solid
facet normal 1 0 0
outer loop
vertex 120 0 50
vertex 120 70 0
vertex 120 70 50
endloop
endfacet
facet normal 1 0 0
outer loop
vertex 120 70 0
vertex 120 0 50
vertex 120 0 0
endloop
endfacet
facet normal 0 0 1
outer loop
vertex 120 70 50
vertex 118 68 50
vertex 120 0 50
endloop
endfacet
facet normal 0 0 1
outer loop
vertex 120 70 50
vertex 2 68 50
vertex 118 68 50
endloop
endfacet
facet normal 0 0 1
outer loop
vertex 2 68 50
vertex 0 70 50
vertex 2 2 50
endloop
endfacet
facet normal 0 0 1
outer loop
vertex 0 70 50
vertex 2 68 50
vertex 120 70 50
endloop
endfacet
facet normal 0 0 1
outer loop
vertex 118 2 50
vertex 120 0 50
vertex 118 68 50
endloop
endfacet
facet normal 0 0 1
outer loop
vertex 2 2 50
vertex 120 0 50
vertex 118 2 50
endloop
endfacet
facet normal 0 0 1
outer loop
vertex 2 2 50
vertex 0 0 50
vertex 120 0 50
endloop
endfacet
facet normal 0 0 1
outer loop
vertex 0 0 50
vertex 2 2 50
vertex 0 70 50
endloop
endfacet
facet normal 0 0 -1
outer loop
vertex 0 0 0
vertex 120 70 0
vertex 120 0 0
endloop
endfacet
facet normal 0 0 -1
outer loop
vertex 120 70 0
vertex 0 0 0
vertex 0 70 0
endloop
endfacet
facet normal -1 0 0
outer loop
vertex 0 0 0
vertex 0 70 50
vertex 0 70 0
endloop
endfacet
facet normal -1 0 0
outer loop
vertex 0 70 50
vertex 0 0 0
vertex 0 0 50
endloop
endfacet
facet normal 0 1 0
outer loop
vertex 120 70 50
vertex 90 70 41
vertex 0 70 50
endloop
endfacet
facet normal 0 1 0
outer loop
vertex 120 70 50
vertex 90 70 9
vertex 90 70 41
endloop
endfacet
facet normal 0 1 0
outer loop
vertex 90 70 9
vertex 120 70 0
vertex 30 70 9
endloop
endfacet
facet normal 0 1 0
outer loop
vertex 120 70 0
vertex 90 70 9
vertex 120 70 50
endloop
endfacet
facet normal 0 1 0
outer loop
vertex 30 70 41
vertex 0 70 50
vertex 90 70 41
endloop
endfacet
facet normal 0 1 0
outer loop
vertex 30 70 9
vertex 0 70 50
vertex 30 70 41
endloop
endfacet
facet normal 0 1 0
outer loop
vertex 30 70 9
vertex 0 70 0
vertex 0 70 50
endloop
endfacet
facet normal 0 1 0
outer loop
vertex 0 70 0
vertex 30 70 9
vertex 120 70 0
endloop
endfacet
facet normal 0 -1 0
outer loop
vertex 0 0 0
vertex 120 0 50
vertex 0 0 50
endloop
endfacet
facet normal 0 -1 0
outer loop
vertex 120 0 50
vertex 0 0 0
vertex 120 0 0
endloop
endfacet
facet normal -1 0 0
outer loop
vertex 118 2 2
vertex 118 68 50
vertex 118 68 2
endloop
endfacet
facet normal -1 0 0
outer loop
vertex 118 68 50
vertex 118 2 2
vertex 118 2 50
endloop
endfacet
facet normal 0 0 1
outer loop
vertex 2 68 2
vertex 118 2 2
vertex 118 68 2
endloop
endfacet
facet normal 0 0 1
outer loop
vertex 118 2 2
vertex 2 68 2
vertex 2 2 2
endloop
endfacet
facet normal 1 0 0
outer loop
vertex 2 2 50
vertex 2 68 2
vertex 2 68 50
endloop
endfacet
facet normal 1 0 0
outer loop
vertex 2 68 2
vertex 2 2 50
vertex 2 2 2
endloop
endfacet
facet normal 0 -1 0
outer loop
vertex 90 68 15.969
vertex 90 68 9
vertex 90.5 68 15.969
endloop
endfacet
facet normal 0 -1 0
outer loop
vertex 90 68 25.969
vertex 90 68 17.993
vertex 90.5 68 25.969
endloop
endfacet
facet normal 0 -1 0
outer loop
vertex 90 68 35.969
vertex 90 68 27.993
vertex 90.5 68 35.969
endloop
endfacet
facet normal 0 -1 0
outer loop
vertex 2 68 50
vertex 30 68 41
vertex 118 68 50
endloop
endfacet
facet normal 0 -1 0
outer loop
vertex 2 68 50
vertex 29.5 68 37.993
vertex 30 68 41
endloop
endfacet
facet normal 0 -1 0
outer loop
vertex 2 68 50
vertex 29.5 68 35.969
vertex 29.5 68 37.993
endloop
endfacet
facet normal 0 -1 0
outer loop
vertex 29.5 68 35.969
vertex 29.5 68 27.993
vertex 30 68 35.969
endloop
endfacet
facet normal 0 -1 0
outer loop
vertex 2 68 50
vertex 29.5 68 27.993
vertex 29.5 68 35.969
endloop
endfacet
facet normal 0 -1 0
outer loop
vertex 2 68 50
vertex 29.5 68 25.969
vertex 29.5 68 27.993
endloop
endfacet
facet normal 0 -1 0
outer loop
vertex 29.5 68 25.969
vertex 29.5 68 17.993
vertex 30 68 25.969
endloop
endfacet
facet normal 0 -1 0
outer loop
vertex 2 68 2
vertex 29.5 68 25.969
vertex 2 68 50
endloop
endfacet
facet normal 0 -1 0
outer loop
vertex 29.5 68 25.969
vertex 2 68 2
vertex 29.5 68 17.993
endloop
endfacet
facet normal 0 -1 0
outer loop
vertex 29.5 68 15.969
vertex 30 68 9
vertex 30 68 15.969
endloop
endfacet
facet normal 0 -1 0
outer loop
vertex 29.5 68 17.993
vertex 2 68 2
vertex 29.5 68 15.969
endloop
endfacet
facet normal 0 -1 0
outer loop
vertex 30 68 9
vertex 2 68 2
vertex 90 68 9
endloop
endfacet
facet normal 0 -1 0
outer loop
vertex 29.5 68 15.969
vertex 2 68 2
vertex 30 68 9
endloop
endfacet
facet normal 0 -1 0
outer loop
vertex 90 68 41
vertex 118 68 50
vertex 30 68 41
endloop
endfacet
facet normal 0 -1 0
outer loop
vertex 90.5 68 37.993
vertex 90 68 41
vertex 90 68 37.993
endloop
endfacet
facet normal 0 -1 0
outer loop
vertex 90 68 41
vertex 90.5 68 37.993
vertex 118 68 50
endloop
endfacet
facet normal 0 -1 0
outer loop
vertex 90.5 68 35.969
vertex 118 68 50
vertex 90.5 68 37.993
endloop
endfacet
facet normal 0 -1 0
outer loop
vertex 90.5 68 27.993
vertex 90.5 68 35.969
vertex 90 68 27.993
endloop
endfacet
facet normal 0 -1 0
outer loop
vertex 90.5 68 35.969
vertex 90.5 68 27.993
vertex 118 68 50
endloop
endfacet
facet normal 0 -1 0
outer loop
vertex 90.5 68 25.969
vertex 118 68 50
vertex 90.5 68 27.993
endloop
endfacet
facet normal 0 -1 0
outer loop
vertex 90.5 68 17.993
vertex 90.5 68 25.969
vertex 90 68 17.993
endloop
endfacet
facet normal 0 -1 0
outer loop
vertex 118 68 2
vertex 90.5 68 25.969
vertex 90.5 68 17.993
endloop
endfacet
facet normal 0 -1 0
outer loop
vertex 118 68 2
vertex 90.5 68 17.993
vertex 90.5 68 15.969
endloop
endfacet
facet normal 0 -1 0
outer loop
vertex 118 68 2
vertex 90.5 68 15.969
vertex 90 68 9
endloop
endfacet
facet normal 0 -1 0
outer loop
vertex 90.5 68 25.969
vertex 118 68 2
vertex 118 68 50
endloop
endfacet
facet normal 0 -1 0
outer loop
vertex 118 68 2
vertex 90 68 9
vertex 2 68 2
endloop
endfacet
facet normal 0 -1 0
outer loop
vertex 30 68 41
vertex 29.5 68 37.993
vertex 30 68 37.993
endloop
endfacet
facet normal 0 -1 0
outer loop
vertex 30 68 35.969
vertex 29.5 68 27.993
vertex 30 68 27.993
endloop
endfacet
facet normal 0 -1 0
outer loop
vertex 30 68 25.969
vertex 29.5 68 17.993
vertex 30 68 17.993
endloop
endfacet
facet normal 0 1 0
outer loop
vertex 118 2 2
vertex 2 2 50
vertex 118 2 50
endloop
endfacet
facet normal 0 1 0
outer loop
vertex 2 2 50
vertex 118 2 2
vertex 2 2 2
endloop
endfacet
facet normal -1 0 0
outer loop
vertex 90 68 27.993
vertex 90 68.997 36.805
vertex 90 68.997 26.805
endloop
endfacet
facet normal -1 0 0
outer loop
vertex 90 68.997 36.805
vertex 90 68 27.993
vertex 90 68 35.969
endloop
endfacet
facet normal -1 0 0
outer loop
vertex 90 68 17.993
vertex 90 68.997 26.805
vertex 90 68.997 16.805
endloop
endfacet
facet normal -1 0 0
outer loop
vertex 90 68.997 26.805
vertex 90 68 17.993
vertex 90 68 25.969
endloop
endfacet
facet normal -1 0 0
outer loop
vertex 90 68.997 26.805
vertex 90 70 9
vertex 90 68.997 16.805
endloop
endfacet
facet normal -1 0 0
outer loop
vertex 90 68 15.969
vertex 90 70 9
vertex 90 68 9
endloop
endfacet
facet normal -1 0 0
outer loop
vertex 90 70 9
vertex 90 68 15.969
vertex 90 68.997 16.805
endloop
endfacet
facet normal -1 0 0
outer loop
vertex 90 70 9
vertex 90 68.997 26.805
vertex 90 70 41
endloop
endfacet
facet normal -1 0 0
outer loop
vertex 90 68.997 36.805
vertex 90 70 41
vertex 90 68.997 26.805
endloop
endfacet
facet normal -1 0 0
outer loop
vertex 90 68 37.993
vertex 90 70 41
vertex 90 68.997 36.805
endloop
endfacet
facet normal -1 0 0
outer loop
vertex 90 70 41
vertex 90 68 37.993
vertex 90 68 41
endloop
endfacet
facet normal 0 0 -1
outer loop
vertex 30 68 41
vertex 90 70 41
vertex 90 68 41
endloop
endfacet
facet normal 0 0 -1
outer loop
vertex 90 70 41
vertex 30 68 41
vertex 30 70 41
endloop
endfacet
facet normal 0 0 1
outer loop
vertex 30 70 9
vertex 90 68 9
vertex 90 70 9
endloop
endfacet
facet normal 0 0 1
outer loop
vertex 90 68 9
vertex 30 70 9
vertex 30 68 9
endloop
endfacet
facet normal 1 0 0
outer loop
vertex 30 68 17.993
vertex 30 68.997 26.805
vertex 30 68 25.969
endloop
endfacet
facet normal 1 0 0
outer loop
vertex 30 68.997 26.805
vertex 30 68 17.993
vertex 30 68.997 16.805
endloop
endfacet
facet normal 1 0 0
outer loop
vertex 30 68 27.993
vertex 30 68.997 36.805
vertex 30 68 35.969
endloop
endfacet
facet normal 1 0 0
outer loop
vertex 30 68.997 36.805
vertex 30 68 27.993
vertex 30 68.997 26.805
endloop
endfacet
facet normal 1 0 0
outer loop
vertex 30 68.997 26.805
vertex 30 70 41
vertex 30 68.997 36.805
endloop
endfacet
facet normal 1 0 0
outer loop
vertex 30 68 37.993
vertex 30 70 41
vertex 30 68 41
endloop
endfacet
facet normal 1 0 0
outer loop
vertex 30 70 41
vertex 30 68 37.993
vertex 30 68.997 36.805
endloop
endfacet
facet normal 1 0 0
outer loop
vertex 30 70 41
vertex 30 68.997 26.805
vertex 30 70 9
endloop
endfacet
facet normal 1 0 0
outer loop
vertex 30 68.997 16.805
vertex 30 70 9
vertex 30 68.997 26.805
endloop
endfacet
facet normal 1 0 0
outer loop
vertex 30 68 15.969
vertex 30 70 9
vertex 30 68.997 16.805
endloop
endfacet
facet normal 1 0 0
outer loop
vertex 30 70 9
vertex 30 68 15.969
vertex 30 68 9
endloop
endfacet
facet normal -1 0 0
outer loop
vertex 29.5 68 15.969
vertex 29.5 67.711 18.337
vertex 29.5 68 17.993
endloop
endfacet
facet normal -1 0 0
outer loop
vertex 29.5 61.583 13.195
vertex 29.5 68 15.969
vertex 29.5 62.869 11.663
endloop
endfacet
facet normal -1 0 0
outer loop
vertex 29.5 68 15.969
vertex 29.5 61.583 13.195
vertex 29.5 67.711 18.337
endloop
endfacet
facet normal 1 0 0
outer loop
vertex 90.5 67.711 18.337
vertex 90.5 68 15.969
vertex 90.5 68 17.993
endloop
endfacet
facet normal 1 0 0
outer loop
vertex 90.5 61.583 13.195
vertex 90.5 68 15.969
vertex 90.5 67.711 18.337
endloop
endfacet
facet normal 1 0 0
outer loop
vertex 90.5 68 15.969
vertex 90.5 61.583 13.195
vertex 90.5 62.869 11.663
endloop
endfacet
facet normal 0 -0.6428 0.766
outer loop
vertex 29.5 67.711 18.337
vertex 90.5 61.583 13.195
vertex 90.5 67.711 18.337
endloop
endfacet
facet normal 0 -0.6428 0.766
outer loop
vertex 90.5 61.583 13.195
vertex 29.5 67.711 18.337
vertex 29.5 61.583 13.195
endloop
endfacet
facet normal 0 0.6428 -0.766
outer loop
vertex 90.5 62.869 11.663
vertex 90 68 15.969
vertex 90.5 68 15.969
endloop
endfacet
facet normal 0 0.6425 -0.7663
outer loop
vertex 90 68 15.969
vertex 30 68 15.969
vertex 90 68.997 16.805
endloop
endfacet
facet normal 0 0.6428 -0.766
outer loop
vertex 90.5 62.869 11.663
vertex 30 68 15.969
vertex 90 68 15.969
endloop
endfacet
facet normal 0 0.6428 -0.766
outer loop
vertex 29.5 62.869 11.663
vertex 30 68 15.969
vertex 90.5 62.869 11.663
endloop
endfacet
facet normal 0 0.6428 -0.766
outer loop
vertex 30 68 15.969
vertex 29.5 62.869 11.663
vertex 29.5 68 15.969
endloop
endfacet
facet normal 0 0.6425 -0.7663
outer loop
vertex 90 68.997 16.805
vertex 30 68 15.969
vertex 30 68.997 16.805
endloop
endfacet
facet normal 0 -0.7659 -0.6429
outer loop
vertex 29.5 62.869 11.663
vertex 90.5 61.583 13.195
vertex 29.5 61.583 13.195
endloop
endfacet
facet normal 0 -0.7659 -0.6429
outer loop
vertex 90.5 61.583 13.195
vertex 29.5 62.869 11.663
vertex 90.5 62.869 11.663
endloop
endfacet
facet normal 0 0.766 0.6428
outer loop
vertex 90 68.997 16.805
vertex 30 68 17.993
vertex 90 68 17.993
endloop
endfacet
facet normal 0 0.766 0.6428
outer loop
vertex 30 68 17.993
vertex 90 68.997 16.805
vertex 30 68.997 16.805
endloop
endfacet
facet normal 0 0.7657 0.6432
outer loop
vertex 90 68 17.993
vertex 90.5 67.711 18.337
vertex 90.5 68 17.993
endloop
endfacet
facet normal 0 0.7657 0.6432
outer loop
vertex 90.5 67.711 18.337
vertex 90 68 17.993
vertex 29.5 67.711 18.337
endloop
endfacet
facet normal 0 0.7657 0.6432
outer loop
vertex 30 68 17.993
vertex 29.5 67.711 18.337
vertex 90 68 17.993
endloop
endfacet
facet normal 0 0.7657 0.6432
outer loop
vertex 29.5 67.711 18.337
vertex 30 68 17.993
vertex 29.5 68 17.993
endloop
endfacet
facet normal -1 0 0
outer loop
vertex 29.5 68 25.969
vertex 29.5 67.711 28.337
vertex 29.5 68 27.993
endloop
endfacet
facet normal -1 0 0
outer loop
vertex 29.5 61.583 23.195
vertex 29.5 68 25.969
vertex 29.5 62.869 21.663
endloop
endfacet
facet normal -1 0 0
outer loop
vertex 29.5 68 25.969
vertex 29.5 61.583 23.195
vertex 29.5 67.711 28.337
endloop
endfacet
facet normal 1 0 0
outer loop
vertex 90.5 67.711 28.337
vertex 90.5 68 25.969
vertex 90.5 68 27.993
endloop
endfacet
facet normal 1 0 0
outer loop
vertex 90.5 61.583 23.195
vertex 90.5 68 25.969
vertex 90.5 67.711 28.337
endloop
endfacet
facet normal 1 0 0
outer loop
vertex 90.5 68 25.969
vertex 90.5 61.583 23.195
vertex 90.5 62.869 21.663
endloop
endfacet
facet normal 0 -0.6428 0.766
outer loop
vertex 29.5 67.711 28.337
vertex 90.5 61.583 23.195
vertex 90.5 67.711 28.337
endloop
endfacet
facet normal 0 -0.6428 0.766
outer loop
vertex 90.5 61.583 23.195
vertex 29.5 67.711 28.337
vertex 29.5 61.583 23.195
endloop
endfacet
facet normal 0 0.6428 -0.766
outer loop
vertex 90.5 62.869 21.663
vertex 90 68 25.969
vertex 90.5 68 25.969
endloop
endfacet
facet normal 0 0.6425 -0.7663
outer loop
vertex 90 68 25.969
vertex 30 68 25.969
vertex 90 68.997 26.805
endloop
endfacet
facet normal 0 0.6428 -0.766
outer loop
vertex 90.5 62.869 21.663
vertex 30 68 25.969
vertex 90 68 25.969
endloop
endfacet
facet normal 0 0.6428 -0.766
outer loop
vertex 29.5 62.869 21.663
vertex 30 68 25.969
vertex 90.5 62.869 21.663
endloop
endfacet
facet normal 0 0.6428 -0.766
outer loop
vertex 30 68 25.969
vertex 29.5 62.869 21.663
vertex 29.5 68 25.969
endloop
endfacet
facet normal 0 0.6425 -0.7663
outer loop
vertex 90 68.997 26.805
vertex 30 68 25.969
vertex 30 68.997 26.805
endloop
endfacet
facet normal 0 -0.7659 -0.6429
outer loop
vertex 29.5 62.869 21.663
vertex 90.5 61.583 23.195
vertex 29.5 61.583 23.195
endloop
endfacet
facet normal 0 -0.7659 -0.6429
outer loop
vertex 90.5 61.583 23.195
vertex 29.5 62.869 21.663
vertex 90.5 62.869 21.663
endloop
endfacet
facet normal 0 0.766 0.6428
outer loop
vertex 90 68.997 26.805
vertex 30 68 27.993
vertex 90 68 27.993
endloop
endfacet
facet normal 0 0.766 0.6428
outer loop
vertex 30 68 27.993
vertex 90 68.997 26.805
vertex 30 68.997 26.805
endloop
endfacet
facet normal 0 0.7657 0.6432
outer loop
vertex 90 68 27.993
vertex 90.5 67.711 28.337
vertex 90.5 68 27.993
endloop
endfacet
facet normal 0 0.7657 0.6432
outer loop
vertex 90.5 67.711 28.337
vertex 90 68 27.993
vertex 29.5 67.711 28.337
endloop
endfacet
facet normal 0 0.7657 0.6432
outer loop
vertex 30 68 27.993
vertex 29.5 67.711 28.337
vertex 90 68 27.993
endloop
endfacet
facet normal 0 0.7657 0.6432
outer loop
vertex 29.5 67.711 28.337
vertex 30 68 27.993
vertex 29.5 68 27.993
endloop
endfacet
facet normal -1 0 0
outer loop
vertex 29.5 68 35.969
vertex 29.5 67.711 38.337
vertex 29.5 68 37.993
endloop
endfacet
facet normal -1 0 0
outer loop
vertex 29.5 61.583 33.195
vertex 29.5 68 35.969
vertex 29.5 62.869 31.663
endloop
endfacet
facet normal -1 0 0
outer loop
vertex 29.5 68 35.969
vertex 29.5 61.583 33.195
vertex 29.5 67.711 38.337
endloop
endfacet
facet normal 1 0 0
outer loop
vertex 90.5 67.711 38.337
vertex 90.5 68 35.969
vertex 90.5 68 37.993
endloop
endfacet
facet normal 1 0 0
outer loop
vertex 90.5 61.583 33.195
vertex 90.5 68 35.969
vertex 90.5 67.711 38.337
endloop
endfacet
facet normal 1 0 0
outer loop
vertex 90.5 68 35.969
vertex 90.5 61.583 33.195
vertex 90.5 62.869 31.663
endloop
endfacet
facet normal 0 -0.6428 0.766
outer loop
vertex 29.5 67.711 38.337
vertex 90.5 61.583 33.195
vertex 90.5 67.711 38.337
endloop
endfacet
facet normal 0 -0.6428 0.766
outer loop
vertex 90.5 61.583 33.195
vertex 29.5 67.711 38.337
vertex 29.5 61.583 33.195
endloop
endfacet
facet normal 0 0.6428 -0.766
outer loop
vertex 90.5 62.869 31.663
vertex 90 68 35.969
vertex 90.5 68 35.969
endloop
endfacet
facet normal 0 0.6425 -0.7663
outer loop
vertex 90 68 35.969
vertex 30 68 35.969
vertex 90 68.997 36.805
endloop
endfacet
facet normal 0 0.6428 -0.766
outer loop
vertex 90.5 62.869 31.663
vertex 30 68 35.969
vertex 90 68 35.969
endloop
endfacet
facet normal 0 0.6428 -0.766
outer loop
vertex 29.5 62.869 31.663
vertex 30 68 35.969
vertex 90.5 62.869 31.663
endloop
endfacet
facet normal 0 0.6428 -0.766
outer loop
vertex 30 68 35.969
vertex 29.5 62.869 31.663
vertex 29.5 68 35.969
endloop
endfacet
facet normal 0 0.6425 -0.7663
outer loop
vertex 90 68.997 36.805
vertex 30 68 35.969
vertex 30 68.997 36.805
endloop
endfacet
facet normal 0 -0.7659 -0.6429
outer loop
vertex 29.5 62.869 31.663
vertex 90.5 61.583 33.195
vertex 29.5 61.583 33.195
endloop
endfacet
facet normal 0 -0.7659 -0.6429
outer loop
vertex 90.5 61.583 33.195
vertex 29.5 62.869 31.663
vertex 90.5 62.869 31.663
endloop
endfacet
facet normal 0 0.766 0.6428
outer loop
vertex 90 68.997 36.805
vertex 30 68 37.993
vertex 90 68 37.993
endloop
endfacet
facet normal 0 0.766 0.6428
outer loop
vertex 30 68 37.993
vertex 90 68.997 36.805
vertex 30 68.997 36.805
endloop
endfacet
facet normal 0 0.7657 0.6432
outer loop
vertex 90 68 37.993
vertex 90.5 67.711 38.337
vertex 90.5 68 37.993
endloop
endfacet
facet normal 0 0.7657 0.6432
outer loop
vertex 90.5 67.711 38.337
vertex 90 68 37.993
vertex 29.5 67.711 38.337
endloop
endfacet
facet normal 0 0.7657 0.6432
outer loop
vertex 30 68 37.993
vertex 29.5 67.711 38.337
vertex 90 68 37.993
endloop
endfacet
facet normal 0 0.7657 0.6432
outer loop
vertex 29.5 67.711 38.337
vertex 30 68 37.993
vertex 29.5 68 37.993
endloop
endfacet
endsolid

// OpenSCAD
$fn = 32;

// ----------------------------------------------------------------------
// Vent box: louvers enclosure
// ----------------------------------------------------------------------

// --- parameters (mm) ---
box_l = 120;              // box length, X
box_w = 70;               // box width, Y
box_h = 50;               // box height, Z
wall_t = 2;               // shell wall thickness
win_l = 60;               // vent window width, X
win_h = 32;               // vent window height, Z
slat_t = 2;               // louver slat thickness
slat_d = 8;               // louver slat depth
slat_a = 40;              // louver slat angle, degrees
slat_pitch = 10;          // louver pitch
slat_yc = 65.29;          // slat centreline Y

win_z0 = (box_h - win_h) / 2;  // window lower edge Z
n_slats = 3;  // louver count
slat_z0 = win_z0 + (win_h - (n_slats - 1) * slat_pitch) / 2;

difference() {
  union() {
    difference() {
      cube([box_l, box_w, box_h]);
  translate([wall_t, wall_t, wall_t])
    cube([box_l - 2 * wall_t, box_w - 2 * wall_t, box_h]);
  translate([(box_l - win_l) / 2, box_w - wall_t - 1, win_z0])
    cube([win_l, wall_t + 2, win_h]);
    }
    for (i = [0 : n_slats - 1])
      translate([box_l / 2, slat_yc, slat_z0 + i * slat_pitch])
        rotate([slat_a, 0, 0])
          cube([win_l + 1, slat_d, slat_t], center = true);
  }
}
